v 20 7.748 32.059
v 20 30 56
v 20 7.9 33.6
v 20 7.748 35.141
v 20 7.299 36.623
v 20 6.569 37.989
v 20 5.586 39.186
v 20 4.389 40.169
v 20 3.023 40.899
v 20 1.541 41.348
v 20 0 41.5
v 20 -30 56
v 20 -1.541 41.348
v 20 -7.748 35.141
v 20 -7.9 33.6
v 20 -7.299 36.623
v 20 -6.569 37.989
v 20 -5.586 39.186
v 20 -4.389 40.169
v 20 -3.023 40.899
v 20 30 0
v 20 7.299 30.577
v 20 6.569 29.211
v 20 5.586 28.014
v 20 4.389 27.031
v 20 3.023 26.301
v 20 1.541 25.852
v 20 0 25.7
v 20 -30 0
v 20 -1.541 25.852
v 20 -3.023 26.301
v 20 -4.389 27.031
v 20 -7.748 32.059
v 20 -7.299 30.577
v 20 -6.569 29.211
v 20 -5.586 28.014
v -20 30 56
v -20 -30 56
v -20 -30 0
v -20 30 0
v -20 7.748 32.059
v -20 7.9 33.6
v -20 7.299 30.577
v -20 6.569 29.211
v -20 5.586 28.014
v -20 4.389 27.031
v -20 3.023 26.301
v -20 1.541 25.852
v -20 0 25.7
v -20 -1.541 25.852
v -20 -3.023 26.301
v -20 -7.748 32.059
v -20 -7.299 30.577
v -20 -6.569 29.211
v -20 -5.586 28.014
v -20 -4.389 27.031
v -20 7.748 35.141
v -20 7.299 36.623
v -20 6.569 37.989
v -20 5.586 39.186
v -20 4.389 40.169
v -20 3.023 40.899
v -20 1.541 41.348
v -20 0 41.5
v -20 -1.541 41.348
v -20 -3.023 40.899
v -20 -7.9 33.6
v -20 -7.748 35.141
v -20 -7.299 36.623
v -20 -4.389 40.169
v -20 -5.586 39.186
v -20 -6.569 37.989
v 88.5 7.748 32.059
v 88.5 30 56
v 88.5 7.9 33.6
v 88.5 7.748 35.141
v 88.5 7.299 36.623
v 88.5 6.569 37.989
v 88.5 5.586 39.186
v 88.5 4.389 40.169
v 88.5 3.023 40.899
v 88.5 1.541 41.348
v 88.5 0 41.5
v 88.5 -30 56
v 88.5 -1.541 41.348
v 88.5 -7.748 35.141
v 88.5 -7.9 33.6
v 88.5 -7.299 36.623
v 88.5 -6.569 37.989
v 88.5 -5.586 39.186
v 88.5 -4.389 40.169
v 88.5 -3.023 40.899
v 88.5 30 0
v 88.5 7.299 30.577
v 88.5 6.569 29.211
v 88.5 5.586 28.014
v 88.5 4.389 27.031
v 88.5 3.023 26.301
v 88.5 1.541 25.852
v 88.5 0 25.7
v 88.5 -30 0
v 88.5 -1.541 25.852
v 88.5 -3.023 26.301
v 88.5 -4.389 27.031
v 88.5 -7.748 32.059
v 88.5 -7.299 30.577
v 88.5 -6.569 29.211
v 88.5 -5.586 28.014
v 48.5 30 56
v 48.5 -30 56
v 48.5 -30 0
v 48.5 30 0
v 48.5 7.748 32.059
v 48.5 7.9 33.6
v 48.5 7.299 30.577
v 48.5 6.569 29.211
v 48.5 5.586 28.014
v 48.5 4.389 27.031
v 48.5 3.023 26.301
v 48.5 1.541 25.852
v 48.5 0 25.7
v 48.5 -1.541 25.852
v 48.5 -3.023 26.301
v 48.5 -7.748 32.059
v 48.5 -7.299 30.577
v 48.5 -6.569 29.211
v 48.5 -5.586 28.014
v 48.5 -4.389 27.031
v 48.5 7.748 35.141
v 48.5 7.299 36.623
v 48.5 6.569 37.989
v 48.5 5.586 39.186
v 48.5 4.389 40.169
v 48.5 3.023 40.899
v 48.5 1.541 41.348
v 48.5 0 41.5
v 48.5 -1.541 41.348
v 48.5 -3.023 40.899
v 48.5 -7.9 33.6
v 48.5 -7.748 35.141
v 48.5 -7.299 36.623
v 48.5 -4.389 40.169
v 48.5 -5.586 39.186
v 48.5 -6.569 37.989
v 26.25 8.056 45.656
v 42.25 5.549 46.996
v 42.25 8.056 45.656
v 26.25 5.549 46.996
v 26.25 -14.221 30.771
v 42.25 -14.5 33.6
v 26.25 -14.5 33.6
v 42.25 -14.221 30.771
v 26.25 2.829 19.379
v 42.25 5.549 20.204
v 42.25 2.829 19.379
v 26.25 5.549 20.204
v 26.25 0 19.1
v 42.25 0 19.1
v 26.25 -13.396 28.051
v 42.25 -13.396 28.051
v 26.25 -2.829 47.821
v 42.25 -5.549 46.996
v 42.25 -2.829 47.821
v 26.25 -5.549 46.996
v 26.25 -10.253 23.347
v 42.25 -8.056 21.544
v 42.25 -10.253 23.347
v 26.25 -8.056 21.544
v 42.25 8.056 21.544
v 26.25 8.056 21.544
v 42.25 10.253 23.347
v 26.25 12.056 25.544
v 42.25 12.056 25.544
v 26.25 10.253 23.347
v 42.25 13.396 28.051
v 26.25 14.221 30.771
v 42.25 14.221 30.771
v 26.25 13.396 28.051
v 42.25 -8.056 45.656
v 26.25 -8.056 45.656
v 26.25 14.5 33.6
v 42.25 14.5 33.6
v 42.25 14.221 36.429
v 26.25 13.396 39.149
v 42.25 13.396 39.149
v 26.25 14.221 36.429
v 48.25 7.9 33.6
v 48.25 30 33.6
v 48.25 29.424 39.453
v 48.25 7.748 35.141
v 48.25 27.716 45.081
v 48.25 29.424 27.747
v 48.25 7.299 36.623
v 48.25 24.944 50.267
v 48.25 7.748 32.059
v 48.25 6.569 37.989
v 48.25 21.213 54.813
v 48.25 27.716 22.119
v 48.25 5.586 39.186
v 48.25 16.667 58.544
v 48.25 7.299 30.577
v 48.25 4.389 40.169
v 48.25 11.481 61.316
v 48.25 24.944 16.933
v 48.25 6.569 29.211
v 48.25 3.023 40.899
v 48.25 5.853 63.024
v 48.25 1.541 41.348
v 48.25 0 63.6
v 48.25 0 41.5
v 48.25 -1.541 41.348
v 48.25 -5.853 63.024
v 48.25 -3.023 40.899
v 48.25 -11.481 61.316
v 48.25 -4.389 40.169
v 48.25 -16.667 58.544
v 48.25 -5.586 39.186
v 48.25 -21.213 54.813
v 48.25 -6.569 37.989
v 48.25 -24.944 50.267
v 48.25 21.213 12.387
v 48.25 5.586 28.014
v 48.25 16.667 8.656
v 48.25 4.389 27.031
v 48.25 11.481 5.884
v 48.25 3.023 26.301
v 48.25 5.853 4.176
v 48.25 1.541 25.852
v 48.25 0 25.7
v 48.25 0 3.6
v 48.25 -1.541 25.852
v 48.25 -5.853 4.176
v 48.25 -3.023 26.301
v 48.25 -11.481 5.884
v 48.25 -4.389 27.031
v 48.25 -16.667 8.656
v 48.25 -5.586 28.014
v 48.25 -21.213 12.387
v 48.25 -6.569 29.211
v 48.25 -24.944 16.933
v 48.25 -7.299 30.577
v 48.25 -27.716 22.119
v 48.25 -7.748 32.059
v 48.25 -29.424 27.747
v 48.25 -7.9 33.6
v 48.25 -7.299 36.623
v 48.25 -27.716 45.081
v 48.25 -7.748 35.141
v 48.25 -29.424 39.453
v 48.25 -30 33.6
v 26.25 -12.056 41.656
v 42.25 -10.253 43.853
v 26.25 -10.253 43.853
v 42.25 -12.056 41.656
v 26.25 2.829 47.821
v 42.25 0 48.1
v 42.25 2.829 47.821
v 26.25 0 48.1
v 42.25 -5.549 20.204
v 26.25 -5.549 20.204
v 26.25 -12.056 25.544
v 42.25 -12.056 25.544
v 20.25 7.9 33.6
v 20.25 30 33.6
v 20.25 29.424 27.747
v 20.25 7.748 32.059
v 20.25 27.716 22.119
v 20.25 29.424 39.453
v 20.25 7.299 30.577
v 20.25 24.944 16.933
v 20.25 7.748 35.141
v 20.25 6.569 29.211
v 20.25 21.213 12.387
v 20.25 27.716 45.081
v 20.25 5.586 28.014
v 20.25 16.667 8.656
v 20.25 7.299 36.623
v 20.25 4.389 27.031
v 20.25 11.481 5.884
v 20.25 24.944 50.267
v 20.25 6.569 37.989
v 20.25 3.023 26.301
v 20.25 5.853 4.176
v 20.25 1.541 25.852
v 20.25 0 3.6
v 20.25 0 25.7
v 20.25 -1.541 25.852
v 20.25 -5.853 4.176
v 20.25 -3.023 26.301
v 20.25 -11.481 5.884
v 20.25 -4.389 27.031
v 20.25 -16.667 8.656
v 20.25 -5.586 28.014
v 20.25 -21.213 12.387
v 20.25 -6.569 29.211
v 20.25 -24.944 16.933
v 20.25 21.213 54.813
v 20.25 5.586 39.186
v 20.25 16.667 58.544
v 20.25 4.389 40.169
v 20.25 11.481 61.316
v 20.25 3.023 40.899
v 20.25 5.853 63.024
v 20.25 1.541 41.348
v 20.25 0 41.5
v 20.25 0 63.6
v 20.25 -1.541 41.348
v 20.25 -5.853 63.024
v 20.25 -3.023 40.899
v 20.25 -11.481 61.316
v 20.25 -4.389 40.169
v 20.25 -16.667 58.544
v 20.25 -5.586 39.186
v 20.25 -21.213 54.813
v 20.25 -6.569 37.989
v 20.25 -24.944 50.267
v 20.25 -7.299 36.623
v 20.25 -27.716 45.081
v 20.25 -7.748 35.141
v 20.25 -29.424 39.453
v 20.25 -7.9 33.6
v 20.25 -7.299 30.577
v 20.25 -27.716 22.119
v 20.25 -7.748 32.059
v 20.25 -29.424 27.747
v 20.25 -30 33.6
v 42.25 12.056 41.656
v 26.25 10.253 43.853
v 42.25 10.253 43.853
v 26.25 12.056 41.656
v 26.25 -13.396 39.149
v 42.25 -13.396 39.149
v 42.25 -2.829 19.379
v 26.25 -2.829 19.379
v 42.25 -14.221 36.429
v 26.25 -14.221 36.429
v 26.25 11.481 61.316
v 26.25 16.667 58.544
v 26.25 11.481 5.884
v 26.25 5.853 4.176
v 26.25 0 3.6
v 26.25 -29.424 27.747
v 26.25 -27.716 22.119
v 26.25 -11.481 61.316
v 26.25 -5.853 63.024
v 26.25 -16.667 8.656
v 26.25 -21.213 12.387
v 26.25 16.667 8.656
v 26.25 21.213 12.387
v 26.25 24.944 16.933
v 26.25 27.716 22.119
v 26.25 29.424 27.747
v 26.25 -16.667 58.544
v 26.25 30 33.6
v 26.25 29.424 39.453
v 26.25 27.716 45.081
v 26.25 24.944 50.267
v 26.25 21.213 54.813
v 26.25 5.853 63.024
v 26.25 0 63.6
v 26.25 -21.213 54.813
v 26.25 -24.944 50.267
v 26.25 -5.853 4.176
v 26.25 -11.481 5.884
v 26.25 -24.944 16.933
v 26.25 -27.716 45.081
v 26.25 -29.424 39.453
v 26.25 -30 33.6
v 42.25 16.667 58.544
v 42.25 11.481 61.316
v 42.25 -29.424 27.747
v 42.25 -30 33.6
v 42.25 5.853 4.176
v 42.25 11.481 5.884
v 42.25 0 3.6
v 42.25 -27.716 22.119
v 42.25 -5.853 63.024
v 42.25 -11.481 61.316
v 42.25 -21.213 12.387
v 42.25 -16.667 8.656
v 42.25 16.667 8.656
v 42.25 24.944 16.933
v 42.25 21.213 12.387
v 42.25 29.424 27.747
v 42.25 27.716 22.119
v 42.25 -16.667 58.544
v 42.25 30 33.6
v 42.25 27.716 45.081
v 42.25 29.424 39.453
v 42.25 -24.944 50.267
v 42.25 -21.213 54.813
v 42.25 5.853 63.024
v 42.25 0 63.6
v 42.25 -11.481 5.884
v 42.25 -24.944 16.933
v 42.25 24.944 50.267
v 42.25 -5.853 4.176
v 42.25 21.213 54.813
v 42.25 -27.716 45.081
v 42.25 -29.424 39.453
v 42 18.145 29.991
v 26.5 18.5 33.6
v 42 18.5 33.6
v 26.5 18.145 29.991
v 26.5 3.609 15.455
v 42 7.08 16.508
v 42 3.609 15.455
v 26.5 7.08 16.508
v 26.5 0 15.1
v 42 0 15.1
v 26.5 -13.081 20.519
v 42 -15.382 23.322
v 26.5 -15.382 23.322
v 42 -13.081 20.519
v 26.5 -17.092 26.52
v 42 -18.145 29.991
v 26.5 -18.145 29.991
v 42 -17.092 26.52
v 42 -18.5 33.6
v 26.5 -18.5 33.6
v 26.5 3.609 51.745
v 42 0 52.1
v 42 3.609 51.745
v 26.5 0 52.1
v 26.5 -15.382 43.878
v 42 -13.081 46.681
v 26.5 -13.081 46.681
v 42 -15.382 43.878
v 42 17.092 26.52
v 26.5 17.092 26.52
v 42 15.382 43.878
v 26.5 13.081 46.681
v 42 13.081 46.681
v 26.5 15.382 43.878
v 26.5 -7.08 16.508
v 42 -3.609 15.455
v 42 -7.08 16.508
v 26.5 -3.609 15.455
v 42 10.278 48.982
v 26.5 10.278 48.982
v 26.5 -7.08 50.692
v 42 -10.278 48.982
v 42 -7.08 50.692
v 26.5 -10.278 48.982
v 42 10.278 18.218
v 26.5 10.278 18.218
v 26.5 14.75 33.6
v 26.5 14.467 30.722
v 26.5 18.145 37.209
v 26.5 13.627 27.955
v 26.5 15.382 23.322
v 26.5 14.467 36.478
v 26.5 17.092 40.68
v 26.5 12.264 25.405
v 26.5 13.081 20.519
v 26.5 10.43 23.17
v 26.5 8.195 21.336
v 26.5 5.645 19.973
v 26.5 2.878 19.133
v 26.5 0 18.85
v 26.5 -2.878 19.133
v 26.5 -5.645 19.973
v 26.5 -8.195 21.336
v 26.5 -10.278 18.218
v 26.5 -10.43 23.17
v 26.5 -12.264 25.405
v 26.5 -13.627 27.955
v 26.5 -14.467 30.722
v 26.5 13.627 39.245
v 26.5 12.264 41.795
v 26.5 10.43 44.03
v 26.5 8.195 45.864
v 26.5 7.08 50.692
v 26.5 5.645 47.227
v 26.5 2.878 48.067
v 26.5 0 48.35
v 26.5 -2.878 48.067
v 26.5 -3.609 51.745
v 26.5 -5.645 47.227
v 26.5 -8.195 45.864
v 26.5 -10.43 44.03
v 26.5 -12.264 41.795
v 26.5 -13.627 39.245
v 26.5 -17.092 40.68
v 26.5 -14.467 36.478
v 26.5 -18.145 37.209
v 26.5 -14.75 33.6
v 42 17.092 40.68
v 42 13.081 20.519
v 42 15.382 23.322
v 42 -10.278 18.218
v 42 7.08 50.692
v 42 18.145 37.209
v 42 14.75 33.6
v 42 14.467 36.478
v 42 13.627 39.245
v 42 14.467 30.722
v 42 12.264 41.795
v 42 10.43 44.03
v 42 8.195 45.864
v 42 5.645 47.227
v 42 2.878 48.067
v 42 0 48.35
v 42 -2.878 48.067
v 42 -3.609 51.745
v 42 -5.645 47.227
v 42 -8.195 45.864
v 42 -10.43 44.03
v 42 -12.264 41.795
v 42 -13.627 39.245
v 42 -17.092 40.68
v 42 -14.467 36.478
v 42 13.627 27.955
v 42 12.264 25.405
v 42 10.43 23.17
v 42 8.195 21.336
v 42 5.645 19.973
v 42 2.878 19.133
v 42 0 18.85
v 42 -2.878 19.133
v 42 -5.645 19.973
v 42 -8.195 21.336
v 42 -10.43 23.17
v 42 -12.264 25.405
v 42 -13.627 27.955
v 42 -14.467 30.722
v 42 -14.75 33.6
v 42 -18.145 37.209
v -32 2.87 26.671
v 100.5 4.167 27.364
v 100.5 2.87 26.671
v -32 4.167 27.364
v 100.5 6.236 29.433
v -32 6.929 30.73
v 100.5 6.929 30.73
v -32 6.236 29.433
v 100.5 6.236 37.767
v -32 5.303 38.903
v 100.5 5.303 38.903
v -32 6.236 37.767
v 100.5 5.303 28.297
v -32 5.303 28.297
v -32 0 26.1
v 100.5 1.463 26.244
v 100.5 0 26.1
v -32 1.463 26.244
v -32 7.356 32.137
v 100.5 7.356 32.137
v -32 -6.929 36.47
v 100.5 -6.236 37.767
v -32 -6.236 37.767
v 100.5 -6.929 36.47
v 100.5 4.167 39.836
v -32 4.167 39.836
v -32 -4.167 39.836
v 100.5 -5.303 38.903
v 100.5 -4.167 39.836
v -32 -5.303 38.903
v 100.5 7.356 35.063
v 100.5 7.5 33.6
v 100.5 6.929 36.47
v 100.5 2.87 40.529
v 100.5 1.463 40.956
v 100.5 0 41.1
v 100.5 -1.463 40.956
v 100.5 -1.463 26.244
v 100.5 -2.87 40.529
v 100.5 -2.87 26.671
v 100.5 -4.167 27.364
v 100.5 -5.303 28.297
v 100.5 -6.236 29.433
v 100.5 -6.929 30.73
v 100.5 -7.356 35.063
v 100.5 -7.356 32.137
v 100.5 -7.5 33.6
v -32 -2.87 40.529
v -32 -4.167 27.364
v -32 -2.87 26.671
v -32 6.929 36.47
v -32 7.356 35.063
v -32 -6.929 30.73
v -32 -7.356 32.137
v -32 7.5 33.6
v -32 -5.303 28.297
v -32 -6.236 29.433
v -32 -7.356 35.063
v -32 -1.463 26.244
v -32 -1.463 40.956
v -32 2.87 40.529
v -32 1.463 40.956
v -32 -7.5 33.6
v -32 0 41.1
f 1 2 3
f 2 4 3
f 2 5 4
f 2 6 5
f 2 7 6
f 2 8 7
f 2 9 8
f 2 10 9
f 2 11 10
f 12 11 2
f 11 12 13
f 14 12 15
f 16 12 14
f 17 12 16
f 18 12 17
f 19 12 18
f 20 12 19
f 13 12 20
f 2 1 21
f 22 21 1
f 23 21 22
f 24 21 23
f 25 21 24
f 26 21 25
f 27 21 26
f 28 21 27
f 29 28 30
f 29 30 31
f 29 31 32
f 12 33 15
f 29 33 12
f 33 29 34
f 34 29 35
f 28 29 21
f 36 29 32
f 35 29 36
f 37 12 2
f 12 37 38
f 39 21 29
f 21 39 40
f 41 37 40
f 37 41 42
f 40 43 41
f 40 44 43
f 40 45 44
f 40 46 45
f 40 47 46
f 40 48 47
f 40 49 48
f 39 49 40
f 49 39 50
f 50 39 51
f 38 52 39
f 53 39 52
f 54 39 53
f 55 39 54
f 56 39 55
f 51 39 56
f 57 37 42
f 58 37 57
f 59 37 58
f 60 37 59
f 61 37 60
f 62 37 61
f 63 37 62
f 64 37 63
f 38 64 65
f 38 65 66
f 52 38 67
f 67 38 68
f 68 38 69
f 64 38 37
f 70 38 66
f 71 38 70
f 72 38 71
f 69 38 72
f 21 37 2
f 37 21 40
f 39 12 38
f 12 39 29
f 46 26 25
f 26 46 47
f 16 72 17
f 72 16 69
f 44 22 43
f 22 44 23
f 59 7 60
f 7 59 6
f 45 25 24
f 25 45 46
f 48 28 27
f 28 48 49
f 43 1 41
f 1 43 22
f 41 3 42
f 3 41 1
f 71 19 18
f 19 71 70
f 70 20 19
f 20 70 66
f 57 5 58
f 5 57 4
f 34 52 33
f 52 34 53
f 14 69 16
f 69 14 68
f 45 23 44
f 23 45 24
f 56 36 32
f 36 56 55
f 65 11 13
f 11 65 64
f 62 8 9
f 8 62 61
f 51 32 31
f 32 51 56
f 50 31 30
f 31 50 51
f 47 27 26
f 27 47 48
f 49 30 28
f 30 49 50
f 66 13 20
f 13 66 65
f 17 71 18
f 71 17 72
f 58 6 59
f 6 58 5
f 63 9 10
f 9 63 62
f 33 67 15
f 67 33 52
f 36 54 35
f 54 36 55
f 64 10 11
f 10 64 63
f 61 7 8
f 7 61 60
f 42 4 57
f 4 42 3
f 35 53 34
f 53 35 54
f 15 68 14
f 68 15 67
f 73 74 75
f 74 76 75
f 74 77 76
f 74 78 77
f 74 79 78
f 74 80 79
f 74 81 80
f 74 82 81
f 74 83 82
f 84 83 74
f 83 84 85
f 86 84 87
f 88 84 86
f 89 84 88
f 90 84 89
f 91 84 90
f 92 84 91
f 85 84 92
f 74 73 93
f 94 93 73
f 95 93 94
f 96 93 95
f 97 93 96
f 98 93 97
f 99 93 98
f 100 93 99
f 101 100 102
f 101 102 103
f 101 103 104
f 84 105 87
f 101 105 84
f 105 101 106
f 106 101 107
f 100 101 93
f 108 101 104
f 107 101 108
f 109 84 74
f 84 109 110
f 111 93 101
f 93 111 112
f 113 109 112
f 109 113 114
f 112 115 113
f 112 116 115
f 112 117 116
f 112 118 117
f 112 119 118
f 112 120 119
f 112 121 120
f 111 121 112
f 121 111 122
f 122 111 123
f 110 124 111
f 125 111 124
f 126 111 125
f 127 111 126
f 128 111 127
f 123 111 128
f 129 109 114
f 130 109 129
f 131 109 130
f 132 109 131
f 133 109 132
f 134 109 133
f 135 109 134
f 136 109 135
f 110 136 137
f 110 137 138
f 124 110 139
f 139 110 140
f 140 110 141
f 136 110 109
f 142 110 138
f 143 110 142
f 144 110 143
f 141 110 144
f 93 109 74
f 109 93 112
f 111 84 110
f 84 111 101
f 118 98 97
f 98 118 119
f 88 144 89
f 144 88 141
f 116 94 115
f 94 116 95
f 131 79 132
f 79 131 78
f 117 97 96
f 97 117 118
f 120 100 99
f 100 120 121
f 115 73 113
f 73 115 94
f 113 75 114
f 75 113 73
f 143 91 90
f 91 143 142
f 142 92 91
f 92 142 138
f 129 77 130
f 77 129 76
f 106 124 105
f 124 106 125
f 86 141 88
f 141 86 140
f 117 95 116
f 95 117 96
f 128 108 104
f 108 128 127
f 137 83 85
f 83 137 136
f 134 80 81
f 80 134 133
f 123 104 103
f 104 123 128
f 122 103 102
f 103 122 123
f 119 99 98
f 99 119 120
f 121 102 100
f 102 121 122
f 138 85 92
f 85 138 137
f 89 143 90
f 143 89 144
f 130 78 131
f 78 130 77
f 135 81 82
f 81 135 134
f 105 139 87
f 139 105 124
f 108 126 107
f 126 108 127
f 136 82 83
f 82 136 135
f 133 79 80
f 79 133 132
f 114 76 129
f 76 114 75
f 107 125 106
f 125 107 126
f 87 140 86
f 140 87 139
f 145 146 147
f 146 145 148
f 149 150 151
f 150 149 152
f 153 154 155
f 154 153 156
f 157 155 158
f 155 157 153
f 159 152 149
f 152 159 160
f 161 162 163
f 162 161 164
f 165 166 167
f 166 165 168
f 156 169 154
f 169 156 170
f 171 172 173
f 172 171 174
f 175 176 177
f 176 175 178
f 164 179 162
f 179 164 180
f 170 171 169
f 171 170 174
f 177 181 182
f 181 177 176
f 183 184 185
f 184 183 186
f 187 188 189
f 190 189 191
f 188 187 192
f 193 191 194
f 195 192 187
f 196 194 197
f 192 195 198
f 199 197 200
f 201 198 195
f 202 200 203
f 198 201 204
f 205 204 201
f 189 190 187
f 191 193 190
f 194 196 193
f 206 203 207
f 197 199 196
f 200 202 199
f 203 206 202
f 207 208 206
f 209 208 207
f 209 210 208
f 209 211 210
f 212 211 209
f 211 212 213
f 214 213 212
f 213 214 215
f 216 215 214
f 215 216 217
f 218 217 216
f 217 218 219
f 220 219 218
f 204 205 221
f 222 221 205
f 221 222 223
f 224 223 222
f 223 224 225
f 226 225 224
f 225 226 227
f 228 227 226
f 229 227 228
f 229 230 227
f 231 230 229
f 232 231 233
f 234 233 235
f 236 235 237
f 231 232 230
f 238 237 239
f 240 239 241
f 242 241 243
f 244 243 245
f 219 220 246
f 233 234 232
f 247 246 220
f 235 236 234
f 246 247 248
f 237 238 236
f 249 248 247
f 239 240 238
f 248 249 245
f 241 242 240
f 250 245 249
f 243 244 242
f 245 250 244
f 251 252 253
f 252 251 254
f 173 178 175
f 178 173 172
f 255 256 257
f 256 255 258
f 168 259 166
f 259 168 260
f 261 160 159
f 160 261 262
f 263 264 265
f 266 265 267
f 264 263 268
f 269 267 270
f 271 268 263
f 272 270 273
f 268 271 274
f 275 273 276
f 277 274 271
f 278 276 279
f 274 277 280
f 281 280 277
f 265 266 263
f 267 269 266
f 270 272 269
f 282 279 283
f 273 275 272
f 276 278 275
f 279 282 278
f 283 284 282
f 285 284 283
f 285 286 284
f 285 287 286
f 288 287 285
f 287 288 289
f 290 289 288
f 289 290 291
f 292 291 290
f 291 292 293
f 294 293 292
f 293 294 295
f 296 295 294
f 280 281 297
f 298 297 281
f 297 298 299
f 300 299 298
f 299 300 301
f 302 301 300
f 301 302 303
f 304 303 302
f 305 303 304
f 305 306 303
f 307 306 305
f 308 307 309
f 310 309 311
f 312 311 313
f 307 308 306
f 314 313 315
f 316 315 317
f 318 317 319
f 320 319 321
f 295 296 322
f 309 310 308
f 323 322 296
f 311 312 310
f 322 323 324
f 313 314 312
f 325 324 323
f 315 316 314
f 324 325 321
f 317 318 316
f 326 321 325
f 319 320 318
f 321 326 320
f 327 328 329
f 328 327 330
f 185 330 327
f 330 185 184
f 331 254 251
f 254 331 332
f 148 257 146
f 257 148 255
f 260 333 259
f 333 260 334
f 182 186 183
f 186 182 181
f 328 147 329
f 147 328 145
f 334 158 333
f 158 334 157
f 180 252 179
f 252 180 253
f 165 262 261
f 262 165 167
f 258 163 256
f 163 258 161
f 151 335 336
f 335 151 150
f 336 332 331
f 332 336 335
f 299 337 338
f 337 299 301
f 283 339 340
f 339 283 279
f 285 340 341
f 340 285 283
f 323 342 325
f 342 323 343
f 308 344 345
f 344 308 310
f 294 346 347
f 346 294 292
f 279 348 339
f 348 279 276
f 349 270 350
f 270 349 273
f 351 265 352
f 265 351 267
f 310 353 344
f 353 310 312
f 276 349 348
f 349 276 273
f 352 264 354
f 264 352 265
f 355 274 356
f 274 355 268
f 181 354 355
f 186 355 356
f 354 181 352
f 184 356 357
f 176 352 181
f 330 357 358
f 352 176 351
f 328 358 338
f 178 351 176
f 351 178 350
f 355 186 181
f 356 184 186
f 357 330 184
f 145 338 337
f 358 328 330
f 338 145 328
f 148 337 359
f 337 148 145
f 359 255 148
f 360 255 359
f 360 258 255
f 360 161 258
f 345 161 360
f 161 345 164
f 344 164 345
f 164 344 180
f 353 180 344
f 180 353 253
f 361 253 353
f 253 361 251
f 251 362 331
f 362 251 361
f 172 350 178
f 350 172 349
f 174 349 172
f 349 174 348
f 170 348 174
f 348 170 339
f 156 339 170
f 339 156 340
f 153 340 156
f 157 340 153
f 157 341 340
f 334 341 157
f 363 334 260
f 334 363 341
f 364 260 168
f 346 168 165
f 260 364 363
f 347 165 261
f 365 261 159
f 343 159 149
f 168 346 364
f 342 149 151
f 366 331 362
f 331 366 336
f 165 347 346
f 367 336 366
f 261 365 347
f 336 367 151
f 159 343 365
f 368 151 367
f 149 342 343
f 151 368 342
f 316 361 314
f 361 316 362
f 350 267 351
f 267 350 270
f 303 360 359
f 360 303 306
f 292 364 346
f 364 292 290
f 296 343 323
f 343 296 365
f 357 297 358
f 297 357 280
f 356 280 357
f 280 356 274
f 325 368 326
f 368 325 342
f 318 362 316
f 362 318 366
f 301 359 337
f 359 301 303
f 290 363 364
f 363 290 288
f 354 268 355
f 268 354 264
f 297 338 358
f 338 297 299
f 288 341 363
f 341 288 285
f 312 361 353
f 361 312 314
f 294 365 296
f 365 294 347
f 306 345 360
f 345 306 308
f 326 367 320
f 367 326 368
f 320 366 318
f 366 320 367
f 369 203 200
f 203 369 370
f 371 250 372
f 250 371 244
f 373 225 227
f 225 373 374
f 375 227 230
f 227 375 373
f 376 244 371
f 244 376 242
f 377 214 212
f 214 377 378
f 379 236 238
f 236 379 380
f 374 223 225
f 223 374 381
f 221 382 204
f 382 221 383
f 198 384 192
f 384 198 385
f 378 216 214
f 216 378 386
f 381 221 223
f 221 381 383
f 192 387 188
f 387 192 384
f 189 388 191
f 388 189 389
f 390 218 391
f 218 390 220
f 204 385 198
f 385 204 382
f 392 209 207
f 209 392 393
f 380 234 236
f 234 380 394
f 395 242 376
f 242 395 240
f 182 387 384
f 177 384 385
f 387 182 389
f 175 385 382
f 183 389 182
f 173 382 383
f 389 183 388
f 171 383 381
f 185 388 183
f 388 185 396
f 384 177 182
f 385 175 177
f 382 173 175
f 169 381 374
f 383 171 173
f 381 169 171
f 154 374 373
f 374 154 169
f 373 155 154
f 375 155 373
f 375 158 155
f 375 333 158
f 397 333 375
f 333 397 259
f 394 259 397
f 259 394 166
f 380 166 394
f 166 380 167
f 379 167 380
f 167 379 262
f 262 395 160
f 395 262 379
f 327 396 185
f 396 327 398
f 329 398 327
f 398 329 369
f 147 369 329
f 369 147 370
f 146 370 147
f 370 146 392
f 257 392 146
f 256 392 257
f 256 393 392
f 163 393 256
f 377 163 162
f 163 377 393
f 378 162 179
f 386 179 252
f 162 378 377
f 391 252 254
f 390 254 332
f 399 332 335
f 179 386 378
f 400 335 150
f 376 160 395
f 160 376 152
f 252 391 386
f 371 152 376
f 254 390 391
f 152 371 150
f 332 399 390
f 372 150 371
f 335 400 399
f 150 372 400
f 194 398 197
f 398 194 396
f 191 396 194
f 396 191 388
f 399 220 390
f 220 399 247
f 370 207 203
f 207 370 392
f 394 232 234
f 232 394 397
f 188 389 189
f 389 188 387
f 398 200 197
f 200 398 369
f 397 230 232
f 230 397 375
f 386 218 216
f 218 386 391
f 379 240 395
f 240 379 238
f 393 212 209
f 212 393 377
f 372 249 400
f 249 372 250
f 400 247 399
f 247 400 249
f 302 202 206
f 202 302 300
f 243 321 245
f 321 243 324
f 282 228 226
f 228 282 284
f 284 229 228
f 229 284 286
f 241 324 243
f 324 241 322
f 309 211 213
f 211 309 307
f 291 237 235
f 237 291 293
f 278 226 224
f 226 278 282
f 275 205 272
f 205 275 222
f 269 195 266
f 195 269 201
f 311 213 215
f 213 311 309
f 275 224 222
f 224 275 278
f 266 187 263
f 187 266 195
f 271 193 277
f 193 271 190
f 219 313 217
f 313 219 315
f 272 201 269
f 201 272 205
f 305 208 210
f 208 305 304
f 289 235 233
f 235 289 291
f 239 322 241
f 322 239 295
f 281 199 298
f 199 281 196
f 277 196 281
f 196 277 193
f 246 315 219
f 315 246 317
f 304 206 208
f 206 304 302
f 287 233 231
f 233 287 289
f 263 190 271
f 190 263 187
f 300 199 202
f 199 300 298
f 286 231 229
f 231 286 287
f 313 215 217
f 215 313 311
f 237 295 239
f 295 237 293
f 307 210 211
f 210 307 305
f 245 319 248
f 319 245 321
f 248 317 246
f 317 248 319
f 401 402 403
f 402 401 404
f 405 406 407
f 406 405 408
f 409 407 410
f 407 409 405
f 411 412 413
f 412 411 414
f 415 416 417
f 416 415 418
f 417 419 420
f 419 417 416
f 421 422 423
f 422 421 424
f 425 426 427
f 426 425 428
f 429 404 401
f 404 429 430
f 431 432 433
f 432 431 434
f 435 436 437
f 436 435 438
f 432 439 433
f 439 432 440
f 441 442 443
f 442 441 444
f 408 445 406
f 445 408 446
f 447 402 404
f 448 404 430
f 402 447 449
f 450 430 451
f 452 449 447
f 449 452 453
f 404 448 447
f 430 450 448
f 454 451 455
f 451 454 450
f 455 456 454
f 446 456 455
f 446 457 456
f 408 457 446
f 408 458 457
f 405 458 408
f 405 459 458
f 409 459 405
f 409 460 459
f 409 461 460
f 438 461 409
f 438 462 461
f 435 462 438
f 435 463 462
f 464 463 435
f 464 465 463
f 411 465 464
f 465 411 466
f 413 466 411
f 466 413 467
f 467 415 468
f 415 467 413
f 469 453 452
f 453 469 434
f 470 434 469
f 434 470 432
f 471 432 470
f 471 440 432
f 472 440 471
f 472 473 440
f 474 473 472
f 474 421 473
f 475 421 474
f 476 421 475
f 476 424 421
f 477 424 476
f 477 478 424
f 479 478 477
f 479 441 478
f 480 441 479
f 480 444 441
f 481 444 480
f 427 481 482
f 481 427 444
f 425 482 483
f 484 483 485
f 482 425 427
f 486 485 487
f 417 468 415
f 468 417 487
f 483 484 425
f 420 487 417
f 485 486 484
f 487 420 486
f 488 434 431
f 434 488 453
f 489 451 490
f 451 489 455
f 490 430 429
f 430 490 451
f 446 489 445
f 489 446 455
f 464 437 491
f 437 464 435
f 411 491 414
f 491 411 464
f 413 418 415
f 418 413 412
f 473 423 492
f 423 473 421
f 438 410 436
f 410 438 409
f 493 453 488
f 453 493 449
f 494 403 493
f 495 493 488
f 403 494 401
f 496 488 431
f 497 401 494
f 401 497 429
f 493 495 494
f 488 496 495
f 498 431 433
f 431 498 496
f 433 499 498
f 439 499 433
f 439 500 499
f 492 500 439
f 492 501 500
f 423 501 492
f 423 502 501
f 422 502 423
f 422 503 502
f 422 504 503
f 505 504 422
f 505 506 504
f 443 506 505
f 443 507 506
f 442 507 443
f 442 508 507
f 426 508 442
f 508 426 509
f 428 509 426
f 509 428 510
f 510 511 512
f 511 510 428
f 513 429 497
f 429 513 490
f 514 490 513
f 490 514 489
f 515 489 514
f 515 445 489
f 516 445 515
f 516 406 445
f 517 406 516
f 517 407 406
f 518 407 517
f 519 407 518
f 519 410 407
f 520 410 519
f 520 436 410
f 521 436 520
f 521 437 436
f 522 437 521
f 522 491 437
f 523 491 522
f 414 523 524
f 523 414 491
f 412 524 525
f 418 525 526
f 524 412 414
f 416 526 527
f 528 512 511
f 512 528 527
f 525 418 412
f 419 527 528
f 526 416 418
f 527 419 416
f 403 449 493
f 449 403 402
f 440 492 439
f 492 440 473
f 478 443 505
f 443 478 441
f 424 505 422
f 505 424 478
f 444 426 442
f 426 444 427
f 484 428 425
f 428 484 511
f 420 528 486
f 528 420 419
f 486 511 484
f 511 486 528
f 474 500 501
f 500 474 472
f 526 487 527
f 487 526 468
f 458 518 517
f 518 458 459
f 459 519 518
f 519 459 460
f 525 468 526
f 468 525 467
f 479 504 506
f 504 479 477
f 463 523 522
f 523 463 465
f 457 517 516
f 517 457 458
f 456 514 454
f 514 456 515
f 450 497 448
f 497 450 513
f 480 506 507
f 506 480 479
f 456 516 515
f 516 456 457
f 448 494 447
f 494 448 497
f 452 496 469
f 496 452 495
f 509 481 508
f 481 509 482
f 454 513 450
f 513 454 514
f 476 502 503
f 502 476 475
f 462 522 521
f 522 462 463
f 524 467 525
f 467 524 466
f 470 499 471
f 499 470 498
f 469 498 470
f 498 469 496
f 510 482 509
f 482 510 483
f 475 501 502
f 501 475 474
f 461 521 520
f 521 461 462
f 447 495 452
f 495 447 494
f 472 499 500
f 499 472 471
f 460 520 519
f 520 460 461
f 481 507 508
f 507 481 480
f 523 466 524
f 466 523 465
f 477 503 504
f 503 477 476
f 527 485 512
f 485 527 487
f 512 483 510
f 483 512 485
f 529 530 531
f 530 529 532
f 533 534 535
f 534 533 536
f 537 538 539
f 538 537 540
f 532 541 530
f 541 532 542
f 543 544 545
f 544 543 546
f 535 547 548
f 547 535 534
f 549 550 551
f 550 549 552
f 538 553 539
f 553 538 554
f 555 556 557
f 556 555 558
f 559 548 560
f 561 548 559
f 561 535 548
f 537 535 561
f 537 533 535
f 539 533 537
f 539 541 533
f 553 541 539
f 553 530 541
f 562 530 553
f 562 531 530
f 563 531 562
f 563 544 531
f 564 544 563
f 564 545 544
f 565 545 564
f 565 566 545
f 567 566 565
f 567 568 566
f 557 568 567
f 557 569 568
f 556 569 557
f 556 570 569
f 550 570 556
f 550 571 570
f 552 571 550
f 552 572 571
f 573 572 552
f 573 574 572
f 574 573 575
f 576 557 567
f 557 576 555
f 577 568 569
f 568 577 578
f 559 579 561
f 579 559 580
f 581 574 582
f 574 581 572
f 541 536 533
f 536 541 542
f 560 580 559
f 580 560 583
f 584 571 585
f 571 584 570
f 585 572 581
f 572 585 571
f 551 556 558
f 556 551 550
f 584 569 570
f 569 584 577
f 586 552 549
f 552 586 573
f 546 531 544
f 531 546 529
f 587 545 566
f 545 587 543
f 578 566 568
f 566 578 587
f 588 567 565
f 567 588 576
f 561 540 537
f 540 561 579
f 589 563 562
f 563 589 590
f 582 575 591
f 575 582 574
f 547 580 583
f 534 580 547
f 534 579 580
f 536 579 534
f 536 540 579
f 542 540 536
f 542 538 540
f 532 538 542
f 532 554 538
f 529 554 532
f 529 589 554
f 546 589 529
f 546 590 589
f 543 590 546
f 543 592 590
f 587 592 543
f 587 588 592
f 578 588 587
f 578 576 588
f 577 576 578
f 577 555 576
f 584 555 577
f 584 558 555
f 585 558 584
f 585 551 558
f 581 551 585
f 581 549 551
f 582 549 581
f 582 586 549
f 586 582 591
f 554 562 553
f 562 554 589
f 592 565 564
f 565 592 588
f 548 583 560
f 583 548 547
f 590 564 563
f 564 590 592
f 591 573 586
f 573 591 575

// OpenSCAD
$fn = 32;

// ------------------------------------------------------------------------
// Pulley assembly: d60 pulley with a belt, shaft d15
// Every part is its own module, assembly() places them once.
// ------------------------------------------------------------------------

// --- part 1 ---
module support1() {
  difference() {
    translate([-20, -30, 0]) cube([40, 60, 56]);
    translate([0, 0, 33.6]) rotate([0, 90, 0]) cylinder(h = 42, d = 15.8, center = true);
  }
}

// --- part 2 ---
module support2() {
  difference() {
    translate([-20, -30, 0]) cube([40, 60, 56]);
    translate([0, 0, 33.6]) rotate([0, 90, 0]) cylinder(h = 42, d = 15.8, center = true);
  }
}

// --- part 3 ---
module shaft() {
  translate([0, 0, -66.25]) cylinder(h = 132.5, d = 15);
}

// --- part 4 ---
module pulley() {
  difference() {
    union() {
      cylinder(h = 28, d = 29);
      cylinder(h = 6, d = 60);
      translate([0, 0, 22]) cylinder(h = 6, d = 60);
    }
    translate([0, 0, -1]) cylinder(h = 30, d = 15.8);
  }
}

// --- part 5 ---
module belt() {
  difference() {
      translate([0, 0, 0]) cylinder(h = 15.5, d = 37);
      translate([0, 0, -1]) cylinder(h = 17.5, d = 29.5);
    }
}

// --- assembly ---
module assembly() {
  translate([0, 0, 0]) rotate([0, 0, 0]) support1();
  translate([68.5, 0, 0]) rotate([0, 0, 0]) support2();
  translate([34.25, 0, 33.6]) rotate([0, 90, 0]) shaft();
  translate([20.25, 0, 33.6]) rotate([0, 90, 0]) pulley();
  translate([26.5, 0, 33.6]) rotate([0, 90, 0]) belt();
}

assembly();
